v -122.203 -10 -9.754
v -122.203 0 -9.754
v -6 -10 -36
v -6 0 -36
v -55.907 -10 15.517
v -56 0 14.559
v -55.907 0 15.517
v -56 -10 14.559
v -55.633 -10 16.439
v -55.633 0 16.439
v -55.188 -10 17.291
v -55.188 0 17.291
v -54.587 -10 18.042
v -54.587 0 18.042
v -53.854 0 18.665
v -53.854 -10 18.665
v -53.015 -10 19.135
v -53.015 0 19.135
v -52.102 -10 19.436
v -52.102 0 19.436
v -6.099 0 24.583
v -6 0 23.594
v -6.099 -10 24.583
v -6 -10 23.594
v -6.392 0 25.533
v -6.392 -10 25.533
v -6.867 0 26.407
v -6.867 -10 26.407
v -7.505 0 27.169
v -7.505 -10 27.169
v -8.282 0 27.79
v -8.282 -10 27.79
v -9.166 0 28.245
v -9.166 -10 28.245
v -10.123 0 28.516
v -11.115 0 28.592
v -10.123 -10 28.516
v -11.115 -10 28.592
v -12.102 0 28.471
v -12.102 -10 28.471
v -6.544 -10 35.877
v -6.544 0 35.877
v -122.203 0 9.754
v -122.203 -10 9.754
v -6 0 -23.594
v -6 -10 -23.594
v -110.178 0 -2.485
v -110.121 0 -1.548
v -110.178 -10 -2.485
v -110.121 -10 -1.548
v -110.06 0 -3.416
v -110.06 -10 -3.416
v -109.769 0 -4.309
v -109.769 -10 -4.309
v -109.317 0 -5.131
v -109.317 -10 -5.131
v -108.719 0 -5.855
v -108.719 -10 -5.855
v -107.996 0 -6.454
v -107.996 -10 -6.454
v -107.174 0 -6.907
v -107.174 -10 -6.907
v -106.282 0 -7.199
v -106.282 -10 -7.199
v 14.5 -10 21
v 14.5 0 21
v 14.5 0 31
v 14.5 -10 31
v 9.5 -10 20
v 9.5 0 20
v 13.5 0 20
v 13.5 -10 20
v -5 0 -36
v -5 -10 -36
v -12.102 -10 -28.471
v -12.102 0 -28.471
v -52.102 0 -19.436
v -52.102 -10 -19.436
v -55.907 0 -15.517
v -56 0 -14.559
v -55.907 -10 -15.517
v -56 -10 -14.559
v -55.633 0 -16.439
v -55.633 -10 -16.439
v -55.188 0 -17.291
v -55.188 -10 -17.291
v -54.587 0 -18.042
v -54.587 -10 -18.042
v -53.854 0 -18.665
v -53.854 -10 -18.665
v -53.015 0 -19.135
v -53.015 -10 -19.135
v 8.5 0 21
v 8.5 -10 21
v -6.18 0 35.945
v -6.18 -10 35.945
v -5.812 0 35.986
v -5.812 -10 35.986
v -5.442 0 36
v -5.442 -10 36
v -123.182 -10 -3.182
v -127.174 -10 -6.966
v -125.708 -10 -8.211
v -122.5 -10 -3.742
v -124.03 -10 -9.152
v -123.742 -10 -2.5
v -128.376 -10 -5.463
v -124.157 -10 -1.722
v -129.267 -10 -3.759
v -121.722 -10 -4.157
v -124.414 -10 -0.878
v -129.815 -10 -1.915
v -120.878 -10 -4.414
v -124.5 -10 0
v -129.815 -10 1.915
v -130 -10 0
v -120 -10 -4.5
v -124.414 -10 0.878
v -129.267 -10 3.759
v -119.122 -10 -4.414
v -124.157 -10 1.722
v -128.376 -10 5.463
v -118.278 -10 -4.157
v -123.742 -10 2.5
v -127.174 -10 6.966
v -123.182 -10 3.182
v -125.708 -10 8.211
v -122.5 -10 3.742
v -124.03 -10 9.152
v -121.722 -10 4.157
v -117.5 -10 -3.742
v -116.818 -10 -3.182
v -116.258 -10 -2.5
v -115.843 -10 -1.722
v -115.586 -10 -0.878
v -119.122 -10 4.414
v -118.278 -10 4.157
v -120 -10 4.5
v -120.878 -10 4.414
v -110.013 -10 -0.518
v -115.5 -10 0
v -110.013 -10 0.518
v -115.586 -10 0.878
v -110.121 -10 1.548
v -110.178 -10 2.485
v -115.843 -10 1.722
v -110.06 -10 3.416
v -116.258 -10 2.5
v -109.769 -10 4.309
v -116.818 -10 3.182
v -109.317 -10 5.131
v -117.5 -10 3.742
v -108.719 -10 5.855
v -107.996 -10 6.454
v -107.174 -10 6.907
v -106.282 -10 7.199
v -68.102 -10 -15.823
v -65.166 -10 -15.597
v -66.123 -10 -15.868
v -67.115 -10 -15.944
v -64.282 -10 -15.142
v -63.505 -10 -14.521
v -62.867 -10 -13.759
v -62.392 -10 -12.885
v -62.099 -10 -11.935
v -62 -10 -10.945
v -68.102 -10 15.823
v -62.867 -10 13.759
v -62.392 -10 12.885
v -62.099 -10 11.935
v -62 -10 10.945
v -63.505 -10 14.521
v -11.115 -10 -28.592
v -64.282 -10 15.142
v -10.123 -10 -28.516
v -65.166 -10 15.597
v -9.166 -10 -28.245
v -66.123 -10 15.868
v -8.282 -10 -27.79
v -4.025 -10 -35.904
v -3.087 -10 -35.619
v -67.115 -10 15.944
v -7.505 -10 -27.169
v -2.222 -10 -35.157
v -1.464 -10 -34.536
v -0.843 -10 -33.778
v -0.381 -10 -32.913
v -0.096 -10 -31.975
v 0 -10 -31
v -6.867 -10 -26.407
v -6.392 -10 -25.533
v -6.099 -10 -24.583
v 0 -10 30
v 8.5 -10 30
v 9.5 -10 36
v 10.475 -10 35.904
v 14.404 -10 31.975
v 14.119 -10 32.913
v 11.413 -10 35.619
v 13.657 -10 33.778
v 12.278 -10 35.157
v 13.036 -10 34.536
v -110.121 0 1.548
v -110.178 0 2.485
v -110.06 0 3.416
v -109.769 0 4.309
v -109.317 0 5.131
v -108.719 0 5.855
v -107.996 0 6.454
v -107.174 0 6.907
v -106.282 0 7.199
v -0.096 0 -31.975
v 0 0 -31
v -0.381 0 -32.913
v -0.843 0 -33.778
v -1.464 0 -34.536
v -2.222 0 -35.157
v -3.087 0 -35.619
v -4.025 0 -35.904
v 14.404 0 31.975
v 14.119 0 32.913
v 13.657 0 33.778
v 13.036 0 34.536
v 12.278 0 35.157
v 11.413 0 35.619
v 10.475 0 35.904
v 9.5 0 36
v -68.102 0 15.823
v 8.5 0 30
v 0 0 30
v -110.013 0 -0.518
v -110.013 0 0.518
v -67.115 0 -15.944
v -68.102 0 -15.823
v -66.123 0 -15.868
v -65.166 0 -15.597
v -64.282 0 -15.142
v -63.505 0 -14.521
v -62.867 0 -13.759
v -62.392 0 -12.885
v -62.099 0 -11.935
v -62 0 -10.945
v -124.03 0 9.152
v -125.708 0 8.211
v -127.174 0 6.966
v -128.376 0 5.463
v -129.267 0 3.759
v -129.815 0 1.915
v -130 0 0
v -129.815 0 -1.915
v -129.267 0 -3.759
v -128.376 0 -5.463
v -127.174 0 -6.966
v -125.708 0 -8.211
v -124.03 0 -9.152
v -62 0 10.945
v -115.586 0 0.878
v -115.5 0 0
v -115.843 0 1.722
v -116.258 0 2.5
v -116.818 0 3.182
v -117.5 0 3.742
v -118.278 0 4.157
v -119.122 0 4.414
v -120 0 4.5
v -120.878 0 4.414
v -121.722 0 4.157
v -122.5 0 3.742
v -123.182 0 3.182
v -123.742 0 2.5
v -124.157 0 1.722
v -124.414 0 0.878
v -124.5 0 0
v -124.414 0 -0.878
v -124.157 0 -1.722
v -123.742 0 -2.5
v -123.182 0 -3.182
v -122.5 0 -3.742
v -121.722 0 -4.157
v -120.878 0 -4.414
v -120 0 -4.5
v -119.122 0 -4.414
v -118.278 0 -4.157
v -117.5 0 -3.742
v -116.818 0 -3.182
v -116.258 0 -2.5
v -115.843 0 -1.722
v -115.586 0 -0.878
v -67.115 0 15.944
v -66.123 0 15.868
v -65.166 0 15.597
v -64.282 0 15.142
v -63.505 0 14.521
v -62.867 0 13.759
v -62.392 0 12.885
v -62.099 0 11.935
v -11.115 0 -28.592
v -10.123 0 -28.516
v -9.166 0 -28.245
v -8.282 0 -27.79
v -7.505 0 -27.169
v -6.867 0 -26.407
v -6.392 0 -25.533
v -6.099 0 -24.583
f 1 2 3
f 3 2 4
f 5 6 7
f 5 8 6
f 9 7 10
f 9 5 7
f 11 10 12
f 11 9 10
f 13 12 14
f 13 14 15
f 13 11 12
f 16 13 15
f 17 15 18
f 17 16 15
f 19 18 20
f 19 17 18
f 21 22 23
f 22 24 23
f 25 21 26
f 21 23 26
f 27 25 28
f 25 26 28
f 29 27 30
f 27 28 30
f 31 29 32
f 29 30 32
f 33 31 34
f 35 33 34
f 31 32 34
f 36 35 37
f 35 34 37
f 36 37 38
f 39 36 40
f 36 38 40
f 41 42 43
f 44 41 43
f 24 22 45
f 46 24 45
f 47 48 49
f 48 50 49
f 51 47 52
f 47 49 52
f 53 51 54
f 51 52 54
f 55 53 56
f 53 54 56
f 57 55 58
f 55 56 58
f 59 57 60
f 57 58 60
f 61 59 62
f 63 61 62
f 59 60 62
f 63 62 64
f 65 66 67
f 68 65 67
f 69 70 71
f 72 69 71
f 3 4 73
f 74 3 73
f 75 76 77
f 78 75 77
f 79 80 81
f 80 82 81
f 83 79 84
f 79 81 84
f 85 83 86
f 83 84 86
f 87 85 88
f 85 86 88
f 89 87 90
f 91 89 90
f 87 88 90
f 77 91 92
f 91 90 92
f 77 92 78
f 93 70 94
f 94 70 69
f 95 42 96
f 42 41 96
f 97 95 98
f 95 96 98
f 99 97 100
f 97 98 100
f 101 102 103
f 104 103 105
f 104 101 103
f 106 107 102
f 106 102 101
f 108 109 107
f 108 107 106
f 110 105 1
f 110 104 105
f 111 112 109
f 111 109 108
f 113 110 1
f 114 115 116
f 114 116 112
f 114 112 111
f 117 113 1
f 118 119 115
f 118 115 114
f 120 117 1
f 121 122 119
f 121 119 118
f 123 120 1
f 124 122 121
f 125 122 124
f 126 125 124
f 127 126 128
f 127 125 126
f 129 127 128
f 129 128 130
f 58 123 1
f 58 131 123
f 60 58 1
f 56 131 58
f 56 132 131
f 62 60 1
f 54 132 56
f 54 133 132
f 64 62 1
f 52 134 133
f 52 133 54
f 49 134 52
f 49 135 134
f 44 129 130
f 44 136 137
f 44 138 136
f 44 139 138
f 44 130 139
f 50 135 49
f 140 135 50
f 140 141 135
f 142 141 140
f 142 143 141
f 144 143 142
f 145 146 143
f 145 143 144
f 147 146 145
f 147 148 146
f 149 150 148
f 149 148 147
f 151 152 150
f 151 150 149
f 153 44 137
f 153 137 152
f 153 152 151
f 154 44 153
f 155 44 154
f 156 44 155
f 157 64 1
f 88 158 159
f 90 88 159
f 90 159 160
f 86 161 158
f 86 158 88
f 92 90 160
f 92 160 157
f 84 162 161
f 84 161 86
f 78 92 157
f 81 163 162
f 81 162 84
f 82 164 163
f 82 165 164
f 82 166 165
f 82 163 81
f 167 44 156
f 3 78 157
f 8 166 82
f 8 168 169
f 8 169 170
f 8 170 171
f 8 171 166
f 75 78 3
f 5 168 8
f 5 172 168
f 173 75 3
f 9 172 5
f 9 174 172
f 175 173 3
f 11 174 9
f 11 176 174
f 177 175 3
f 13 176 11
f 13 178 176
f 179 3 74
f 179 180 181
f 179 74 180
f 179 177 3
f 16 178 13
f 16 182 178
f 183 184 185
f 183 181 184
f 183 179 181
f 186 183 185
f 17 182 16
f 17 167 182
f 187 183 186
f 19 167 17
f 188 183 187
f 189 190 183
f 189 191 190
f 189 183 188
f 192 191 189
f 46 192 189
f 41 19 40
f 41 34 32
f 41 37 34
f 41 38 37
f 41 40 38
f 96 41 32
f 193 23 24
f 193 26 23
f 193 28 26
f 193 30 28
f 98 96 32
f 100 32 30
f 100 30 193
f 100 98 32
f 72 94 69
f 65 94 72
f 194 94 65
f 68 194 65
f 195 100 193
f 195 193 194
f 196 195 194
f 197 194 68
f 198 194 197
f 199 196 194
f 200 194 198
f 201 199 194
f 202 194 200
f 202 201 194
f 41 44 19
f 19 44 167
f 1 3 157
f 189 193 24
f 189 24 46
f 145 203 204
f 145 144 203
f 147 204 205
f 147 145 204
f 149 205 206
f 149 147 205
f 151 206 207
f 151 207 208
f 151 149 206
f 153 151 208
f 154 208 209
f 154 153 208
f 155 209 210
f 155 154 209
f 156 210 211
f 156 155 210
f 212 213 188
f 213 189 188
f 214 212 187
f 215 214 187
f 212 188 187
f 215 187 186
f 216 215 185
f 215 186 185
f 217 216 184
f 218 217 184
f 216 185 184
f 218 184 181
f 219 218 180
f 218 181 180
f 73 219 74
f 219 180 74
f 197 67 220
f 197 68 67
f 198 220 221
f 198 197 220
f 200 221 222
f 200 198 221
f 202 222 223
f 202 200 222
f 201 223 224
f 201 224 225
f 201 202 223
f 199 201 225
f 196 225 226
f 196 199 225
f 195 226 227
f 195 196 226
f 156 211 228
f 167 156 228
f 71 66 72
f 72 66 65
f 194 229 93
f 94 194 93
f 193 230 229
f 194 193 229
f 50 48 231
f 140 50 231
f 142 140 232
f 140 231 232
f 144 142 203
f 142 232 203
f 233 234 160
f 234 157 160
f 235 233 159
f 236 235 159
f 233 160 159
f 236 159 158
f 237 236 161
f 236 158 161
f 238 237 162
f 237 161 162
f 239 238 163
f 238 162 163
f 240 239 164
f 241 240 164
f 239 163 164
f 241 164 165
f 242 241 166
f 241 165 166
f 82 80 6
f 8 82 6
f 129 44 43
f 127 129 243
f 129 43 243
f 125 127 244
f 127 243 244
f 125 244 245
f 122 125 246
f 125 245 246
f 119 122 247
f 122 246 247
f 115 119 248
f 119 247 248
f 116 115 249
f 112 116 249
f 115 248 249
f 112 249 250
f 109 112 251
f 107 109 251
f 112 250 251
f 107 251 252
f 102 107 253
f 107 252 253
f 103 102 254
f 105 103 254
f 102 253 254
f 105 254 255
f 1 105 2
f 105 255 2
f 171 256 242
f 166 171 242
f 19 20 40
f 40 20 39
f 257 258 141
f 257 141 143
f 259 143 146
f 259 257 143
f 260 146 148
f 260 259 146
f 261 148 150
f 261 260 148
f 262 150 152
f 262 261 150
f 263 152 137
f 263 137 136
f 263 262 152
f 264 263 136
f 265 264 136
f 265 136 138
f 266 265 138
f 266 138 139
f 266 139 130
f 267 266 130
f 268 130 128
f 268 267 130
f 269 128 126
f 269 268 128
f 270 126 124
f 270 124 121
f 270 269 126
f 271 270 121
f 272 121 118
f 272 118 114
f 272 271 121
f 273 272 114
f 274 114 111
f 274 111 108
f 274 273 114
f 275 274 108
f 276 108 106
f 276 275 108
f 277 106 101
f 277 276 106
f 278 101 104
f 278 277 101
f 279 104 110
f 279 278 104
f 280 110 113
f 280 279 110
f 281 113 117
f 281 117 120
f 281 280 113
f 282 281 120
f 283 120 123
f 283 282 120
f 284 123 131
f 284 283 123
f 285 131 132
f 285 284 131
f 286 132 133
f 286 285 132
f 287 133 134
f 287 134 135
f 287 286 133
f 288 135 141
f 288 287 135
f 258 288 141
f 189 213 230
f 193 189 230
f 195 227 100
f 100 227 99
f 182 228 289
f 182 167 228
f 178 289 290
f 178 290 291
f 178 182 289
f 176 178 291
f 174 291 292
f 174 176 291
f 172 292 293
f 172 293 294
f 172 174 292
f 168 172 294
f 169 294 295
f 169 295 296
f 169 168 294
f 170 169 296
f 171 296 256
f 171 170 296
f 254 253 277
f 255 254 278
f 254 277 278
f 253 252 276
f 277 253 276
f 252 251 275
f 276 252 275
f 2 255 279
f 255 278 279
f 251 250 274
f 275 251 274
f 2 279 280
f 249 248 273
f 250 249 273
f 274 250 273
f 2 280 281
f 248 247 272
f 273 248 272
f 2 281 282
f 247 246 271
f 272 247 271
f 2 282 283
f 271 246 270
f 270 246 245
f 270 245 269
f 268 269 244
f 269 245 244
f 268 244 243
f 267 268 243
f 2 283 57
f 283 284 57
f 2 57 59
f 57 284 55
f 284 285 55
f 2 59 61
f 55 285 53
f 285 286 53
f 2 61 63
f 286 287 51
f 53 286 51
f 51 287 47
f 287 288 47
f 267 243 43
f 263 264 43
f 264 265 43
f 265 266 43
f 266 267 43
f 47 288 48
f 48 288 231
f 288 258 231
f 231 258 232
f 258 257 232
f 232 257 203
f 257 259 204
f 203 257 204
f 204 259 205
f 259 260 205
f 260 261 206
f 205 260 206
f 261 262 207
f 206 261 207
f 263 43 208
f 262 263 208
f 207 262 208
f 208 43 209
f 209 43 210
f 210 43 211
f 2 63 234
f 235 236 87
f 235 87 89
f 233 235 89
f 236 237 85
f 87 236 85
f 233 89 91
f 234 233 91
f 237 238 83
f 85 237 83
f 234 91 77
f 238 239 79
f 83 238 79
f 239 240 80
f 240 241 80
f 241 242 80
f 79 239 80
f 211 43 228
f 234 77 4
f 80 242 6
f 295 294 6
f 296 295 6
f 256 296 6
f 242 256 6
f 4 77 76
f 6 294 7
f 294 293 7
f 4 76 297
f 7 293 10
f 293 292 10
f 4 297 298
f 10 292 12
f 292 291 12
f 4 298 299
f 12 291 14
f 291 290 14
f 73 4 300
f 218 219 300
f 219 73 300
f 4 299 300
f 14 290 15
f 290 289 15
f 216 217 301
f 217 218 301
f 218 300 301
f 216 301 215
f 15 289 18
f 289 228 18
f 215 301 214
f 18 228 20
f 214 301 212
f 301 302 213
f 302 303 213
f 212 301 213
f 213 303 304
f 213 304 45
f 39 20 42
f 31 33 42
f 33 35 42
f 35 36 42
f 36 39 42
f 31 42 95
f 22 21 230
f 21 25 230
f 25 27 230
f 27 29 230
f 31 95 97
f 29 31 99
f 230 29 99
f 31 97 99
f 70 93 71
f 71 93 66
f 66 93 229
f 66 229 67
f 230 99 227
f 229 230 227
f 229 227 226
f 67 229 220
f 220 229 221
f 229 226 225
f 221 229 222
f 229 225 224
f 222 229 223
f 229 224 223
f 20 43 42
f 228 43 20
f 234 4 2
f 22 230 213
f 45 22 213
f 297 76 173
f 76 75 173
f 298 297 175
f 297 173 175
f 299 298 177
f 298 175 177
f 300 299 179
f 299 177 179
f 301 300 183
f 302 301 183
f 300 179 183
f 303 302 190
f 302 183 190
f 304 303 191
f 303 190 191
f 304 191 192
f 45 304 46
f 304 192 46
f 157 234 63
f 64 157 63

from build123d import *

# Parameters (mm, degrees)
F0_R     = 4.5
F1_DEPTH = 10
F2_R     = 5
F3_SIZE  = 1


with BuildPart() as f1:
    # F0 (on Front) → F1 (new body)
    with BuildSketch(Plane.XZ):
        with BuildLine():
            Line((0, -36), (0, 0))
            Line((0, 0), (0, 30))
            Line((0, 30), (8.5, 30))
            Line((8.5, 30), (8.5, 20))
            Line((8.5, 20), (14.5, 20))
            Line((14.5, 20), (14.5, 36))
            Line((14.5, 36), (8.5, 36))
            Line((8.5, 36), (0, 36))
            Line((0, 36), (-6, 36))
            Line((-6, 36), (-122.203111, 9.754297))
            ThreePointArc((-122.203111, 9.754297), (-130, 0), (-122.203111, -9.754297))
            Line((-122.203111, -9.754297), (-6, -36))
            Line((-6, -36), (0, -36))
        make_face()
        with Locations((-120, 0)):
            Circle(F0_R, mode=Mode.SUBTRACT)
        with BuildLine():
            Line((-111.941284, 5.920903), (-62, 17.200671))
            Line((-62, 17.200671), (-62, -17.200671))
            Line((-62, -17.200671), (-111.941284, -5.920903))
            ThreePointArc((-111.941284, -5.920903), (-110, 0), (-111.941284, 5.920903))
        make_face(mode=Mode.SUBTRACT)
        Polygon((-56, 18.555835), (-6, 29.848864), (-6, -29.848864), (-56, -18.555835), align=None, mode=Mode.SUBTRACT)
    extrude(amount=F1_DEPTH)

    # F2
    f2_edges = [f1.edges().sort_by_distance(p)[0] for p in [
        (-111.941284, -5, -5.920903),
        (-111.941284, -5, 5.920903),
        (-62, -5, -17.200671),
        (-56, -5, 18.555835),
        (-56, -5, -18.555835),
        (-62, -5, 17.200671),
        (-6, -5, 29.848864),
        (-6, -5, -29.848864),
        (14.5, -5, 36),
        (0, -5, -36),
        (-6, -5, 36),
    ]]
    fillet(f2_edges, radius=F2_R)

    # F3
    f3_edges = [f1.edges().sort_by_distance(p)[0] for p in [
        (8.5, -5, 20),
        (14.5, -5, 20),
    ]]
    chamfer(f3_edges, length=F3_SIZE)


solid = f1.part
